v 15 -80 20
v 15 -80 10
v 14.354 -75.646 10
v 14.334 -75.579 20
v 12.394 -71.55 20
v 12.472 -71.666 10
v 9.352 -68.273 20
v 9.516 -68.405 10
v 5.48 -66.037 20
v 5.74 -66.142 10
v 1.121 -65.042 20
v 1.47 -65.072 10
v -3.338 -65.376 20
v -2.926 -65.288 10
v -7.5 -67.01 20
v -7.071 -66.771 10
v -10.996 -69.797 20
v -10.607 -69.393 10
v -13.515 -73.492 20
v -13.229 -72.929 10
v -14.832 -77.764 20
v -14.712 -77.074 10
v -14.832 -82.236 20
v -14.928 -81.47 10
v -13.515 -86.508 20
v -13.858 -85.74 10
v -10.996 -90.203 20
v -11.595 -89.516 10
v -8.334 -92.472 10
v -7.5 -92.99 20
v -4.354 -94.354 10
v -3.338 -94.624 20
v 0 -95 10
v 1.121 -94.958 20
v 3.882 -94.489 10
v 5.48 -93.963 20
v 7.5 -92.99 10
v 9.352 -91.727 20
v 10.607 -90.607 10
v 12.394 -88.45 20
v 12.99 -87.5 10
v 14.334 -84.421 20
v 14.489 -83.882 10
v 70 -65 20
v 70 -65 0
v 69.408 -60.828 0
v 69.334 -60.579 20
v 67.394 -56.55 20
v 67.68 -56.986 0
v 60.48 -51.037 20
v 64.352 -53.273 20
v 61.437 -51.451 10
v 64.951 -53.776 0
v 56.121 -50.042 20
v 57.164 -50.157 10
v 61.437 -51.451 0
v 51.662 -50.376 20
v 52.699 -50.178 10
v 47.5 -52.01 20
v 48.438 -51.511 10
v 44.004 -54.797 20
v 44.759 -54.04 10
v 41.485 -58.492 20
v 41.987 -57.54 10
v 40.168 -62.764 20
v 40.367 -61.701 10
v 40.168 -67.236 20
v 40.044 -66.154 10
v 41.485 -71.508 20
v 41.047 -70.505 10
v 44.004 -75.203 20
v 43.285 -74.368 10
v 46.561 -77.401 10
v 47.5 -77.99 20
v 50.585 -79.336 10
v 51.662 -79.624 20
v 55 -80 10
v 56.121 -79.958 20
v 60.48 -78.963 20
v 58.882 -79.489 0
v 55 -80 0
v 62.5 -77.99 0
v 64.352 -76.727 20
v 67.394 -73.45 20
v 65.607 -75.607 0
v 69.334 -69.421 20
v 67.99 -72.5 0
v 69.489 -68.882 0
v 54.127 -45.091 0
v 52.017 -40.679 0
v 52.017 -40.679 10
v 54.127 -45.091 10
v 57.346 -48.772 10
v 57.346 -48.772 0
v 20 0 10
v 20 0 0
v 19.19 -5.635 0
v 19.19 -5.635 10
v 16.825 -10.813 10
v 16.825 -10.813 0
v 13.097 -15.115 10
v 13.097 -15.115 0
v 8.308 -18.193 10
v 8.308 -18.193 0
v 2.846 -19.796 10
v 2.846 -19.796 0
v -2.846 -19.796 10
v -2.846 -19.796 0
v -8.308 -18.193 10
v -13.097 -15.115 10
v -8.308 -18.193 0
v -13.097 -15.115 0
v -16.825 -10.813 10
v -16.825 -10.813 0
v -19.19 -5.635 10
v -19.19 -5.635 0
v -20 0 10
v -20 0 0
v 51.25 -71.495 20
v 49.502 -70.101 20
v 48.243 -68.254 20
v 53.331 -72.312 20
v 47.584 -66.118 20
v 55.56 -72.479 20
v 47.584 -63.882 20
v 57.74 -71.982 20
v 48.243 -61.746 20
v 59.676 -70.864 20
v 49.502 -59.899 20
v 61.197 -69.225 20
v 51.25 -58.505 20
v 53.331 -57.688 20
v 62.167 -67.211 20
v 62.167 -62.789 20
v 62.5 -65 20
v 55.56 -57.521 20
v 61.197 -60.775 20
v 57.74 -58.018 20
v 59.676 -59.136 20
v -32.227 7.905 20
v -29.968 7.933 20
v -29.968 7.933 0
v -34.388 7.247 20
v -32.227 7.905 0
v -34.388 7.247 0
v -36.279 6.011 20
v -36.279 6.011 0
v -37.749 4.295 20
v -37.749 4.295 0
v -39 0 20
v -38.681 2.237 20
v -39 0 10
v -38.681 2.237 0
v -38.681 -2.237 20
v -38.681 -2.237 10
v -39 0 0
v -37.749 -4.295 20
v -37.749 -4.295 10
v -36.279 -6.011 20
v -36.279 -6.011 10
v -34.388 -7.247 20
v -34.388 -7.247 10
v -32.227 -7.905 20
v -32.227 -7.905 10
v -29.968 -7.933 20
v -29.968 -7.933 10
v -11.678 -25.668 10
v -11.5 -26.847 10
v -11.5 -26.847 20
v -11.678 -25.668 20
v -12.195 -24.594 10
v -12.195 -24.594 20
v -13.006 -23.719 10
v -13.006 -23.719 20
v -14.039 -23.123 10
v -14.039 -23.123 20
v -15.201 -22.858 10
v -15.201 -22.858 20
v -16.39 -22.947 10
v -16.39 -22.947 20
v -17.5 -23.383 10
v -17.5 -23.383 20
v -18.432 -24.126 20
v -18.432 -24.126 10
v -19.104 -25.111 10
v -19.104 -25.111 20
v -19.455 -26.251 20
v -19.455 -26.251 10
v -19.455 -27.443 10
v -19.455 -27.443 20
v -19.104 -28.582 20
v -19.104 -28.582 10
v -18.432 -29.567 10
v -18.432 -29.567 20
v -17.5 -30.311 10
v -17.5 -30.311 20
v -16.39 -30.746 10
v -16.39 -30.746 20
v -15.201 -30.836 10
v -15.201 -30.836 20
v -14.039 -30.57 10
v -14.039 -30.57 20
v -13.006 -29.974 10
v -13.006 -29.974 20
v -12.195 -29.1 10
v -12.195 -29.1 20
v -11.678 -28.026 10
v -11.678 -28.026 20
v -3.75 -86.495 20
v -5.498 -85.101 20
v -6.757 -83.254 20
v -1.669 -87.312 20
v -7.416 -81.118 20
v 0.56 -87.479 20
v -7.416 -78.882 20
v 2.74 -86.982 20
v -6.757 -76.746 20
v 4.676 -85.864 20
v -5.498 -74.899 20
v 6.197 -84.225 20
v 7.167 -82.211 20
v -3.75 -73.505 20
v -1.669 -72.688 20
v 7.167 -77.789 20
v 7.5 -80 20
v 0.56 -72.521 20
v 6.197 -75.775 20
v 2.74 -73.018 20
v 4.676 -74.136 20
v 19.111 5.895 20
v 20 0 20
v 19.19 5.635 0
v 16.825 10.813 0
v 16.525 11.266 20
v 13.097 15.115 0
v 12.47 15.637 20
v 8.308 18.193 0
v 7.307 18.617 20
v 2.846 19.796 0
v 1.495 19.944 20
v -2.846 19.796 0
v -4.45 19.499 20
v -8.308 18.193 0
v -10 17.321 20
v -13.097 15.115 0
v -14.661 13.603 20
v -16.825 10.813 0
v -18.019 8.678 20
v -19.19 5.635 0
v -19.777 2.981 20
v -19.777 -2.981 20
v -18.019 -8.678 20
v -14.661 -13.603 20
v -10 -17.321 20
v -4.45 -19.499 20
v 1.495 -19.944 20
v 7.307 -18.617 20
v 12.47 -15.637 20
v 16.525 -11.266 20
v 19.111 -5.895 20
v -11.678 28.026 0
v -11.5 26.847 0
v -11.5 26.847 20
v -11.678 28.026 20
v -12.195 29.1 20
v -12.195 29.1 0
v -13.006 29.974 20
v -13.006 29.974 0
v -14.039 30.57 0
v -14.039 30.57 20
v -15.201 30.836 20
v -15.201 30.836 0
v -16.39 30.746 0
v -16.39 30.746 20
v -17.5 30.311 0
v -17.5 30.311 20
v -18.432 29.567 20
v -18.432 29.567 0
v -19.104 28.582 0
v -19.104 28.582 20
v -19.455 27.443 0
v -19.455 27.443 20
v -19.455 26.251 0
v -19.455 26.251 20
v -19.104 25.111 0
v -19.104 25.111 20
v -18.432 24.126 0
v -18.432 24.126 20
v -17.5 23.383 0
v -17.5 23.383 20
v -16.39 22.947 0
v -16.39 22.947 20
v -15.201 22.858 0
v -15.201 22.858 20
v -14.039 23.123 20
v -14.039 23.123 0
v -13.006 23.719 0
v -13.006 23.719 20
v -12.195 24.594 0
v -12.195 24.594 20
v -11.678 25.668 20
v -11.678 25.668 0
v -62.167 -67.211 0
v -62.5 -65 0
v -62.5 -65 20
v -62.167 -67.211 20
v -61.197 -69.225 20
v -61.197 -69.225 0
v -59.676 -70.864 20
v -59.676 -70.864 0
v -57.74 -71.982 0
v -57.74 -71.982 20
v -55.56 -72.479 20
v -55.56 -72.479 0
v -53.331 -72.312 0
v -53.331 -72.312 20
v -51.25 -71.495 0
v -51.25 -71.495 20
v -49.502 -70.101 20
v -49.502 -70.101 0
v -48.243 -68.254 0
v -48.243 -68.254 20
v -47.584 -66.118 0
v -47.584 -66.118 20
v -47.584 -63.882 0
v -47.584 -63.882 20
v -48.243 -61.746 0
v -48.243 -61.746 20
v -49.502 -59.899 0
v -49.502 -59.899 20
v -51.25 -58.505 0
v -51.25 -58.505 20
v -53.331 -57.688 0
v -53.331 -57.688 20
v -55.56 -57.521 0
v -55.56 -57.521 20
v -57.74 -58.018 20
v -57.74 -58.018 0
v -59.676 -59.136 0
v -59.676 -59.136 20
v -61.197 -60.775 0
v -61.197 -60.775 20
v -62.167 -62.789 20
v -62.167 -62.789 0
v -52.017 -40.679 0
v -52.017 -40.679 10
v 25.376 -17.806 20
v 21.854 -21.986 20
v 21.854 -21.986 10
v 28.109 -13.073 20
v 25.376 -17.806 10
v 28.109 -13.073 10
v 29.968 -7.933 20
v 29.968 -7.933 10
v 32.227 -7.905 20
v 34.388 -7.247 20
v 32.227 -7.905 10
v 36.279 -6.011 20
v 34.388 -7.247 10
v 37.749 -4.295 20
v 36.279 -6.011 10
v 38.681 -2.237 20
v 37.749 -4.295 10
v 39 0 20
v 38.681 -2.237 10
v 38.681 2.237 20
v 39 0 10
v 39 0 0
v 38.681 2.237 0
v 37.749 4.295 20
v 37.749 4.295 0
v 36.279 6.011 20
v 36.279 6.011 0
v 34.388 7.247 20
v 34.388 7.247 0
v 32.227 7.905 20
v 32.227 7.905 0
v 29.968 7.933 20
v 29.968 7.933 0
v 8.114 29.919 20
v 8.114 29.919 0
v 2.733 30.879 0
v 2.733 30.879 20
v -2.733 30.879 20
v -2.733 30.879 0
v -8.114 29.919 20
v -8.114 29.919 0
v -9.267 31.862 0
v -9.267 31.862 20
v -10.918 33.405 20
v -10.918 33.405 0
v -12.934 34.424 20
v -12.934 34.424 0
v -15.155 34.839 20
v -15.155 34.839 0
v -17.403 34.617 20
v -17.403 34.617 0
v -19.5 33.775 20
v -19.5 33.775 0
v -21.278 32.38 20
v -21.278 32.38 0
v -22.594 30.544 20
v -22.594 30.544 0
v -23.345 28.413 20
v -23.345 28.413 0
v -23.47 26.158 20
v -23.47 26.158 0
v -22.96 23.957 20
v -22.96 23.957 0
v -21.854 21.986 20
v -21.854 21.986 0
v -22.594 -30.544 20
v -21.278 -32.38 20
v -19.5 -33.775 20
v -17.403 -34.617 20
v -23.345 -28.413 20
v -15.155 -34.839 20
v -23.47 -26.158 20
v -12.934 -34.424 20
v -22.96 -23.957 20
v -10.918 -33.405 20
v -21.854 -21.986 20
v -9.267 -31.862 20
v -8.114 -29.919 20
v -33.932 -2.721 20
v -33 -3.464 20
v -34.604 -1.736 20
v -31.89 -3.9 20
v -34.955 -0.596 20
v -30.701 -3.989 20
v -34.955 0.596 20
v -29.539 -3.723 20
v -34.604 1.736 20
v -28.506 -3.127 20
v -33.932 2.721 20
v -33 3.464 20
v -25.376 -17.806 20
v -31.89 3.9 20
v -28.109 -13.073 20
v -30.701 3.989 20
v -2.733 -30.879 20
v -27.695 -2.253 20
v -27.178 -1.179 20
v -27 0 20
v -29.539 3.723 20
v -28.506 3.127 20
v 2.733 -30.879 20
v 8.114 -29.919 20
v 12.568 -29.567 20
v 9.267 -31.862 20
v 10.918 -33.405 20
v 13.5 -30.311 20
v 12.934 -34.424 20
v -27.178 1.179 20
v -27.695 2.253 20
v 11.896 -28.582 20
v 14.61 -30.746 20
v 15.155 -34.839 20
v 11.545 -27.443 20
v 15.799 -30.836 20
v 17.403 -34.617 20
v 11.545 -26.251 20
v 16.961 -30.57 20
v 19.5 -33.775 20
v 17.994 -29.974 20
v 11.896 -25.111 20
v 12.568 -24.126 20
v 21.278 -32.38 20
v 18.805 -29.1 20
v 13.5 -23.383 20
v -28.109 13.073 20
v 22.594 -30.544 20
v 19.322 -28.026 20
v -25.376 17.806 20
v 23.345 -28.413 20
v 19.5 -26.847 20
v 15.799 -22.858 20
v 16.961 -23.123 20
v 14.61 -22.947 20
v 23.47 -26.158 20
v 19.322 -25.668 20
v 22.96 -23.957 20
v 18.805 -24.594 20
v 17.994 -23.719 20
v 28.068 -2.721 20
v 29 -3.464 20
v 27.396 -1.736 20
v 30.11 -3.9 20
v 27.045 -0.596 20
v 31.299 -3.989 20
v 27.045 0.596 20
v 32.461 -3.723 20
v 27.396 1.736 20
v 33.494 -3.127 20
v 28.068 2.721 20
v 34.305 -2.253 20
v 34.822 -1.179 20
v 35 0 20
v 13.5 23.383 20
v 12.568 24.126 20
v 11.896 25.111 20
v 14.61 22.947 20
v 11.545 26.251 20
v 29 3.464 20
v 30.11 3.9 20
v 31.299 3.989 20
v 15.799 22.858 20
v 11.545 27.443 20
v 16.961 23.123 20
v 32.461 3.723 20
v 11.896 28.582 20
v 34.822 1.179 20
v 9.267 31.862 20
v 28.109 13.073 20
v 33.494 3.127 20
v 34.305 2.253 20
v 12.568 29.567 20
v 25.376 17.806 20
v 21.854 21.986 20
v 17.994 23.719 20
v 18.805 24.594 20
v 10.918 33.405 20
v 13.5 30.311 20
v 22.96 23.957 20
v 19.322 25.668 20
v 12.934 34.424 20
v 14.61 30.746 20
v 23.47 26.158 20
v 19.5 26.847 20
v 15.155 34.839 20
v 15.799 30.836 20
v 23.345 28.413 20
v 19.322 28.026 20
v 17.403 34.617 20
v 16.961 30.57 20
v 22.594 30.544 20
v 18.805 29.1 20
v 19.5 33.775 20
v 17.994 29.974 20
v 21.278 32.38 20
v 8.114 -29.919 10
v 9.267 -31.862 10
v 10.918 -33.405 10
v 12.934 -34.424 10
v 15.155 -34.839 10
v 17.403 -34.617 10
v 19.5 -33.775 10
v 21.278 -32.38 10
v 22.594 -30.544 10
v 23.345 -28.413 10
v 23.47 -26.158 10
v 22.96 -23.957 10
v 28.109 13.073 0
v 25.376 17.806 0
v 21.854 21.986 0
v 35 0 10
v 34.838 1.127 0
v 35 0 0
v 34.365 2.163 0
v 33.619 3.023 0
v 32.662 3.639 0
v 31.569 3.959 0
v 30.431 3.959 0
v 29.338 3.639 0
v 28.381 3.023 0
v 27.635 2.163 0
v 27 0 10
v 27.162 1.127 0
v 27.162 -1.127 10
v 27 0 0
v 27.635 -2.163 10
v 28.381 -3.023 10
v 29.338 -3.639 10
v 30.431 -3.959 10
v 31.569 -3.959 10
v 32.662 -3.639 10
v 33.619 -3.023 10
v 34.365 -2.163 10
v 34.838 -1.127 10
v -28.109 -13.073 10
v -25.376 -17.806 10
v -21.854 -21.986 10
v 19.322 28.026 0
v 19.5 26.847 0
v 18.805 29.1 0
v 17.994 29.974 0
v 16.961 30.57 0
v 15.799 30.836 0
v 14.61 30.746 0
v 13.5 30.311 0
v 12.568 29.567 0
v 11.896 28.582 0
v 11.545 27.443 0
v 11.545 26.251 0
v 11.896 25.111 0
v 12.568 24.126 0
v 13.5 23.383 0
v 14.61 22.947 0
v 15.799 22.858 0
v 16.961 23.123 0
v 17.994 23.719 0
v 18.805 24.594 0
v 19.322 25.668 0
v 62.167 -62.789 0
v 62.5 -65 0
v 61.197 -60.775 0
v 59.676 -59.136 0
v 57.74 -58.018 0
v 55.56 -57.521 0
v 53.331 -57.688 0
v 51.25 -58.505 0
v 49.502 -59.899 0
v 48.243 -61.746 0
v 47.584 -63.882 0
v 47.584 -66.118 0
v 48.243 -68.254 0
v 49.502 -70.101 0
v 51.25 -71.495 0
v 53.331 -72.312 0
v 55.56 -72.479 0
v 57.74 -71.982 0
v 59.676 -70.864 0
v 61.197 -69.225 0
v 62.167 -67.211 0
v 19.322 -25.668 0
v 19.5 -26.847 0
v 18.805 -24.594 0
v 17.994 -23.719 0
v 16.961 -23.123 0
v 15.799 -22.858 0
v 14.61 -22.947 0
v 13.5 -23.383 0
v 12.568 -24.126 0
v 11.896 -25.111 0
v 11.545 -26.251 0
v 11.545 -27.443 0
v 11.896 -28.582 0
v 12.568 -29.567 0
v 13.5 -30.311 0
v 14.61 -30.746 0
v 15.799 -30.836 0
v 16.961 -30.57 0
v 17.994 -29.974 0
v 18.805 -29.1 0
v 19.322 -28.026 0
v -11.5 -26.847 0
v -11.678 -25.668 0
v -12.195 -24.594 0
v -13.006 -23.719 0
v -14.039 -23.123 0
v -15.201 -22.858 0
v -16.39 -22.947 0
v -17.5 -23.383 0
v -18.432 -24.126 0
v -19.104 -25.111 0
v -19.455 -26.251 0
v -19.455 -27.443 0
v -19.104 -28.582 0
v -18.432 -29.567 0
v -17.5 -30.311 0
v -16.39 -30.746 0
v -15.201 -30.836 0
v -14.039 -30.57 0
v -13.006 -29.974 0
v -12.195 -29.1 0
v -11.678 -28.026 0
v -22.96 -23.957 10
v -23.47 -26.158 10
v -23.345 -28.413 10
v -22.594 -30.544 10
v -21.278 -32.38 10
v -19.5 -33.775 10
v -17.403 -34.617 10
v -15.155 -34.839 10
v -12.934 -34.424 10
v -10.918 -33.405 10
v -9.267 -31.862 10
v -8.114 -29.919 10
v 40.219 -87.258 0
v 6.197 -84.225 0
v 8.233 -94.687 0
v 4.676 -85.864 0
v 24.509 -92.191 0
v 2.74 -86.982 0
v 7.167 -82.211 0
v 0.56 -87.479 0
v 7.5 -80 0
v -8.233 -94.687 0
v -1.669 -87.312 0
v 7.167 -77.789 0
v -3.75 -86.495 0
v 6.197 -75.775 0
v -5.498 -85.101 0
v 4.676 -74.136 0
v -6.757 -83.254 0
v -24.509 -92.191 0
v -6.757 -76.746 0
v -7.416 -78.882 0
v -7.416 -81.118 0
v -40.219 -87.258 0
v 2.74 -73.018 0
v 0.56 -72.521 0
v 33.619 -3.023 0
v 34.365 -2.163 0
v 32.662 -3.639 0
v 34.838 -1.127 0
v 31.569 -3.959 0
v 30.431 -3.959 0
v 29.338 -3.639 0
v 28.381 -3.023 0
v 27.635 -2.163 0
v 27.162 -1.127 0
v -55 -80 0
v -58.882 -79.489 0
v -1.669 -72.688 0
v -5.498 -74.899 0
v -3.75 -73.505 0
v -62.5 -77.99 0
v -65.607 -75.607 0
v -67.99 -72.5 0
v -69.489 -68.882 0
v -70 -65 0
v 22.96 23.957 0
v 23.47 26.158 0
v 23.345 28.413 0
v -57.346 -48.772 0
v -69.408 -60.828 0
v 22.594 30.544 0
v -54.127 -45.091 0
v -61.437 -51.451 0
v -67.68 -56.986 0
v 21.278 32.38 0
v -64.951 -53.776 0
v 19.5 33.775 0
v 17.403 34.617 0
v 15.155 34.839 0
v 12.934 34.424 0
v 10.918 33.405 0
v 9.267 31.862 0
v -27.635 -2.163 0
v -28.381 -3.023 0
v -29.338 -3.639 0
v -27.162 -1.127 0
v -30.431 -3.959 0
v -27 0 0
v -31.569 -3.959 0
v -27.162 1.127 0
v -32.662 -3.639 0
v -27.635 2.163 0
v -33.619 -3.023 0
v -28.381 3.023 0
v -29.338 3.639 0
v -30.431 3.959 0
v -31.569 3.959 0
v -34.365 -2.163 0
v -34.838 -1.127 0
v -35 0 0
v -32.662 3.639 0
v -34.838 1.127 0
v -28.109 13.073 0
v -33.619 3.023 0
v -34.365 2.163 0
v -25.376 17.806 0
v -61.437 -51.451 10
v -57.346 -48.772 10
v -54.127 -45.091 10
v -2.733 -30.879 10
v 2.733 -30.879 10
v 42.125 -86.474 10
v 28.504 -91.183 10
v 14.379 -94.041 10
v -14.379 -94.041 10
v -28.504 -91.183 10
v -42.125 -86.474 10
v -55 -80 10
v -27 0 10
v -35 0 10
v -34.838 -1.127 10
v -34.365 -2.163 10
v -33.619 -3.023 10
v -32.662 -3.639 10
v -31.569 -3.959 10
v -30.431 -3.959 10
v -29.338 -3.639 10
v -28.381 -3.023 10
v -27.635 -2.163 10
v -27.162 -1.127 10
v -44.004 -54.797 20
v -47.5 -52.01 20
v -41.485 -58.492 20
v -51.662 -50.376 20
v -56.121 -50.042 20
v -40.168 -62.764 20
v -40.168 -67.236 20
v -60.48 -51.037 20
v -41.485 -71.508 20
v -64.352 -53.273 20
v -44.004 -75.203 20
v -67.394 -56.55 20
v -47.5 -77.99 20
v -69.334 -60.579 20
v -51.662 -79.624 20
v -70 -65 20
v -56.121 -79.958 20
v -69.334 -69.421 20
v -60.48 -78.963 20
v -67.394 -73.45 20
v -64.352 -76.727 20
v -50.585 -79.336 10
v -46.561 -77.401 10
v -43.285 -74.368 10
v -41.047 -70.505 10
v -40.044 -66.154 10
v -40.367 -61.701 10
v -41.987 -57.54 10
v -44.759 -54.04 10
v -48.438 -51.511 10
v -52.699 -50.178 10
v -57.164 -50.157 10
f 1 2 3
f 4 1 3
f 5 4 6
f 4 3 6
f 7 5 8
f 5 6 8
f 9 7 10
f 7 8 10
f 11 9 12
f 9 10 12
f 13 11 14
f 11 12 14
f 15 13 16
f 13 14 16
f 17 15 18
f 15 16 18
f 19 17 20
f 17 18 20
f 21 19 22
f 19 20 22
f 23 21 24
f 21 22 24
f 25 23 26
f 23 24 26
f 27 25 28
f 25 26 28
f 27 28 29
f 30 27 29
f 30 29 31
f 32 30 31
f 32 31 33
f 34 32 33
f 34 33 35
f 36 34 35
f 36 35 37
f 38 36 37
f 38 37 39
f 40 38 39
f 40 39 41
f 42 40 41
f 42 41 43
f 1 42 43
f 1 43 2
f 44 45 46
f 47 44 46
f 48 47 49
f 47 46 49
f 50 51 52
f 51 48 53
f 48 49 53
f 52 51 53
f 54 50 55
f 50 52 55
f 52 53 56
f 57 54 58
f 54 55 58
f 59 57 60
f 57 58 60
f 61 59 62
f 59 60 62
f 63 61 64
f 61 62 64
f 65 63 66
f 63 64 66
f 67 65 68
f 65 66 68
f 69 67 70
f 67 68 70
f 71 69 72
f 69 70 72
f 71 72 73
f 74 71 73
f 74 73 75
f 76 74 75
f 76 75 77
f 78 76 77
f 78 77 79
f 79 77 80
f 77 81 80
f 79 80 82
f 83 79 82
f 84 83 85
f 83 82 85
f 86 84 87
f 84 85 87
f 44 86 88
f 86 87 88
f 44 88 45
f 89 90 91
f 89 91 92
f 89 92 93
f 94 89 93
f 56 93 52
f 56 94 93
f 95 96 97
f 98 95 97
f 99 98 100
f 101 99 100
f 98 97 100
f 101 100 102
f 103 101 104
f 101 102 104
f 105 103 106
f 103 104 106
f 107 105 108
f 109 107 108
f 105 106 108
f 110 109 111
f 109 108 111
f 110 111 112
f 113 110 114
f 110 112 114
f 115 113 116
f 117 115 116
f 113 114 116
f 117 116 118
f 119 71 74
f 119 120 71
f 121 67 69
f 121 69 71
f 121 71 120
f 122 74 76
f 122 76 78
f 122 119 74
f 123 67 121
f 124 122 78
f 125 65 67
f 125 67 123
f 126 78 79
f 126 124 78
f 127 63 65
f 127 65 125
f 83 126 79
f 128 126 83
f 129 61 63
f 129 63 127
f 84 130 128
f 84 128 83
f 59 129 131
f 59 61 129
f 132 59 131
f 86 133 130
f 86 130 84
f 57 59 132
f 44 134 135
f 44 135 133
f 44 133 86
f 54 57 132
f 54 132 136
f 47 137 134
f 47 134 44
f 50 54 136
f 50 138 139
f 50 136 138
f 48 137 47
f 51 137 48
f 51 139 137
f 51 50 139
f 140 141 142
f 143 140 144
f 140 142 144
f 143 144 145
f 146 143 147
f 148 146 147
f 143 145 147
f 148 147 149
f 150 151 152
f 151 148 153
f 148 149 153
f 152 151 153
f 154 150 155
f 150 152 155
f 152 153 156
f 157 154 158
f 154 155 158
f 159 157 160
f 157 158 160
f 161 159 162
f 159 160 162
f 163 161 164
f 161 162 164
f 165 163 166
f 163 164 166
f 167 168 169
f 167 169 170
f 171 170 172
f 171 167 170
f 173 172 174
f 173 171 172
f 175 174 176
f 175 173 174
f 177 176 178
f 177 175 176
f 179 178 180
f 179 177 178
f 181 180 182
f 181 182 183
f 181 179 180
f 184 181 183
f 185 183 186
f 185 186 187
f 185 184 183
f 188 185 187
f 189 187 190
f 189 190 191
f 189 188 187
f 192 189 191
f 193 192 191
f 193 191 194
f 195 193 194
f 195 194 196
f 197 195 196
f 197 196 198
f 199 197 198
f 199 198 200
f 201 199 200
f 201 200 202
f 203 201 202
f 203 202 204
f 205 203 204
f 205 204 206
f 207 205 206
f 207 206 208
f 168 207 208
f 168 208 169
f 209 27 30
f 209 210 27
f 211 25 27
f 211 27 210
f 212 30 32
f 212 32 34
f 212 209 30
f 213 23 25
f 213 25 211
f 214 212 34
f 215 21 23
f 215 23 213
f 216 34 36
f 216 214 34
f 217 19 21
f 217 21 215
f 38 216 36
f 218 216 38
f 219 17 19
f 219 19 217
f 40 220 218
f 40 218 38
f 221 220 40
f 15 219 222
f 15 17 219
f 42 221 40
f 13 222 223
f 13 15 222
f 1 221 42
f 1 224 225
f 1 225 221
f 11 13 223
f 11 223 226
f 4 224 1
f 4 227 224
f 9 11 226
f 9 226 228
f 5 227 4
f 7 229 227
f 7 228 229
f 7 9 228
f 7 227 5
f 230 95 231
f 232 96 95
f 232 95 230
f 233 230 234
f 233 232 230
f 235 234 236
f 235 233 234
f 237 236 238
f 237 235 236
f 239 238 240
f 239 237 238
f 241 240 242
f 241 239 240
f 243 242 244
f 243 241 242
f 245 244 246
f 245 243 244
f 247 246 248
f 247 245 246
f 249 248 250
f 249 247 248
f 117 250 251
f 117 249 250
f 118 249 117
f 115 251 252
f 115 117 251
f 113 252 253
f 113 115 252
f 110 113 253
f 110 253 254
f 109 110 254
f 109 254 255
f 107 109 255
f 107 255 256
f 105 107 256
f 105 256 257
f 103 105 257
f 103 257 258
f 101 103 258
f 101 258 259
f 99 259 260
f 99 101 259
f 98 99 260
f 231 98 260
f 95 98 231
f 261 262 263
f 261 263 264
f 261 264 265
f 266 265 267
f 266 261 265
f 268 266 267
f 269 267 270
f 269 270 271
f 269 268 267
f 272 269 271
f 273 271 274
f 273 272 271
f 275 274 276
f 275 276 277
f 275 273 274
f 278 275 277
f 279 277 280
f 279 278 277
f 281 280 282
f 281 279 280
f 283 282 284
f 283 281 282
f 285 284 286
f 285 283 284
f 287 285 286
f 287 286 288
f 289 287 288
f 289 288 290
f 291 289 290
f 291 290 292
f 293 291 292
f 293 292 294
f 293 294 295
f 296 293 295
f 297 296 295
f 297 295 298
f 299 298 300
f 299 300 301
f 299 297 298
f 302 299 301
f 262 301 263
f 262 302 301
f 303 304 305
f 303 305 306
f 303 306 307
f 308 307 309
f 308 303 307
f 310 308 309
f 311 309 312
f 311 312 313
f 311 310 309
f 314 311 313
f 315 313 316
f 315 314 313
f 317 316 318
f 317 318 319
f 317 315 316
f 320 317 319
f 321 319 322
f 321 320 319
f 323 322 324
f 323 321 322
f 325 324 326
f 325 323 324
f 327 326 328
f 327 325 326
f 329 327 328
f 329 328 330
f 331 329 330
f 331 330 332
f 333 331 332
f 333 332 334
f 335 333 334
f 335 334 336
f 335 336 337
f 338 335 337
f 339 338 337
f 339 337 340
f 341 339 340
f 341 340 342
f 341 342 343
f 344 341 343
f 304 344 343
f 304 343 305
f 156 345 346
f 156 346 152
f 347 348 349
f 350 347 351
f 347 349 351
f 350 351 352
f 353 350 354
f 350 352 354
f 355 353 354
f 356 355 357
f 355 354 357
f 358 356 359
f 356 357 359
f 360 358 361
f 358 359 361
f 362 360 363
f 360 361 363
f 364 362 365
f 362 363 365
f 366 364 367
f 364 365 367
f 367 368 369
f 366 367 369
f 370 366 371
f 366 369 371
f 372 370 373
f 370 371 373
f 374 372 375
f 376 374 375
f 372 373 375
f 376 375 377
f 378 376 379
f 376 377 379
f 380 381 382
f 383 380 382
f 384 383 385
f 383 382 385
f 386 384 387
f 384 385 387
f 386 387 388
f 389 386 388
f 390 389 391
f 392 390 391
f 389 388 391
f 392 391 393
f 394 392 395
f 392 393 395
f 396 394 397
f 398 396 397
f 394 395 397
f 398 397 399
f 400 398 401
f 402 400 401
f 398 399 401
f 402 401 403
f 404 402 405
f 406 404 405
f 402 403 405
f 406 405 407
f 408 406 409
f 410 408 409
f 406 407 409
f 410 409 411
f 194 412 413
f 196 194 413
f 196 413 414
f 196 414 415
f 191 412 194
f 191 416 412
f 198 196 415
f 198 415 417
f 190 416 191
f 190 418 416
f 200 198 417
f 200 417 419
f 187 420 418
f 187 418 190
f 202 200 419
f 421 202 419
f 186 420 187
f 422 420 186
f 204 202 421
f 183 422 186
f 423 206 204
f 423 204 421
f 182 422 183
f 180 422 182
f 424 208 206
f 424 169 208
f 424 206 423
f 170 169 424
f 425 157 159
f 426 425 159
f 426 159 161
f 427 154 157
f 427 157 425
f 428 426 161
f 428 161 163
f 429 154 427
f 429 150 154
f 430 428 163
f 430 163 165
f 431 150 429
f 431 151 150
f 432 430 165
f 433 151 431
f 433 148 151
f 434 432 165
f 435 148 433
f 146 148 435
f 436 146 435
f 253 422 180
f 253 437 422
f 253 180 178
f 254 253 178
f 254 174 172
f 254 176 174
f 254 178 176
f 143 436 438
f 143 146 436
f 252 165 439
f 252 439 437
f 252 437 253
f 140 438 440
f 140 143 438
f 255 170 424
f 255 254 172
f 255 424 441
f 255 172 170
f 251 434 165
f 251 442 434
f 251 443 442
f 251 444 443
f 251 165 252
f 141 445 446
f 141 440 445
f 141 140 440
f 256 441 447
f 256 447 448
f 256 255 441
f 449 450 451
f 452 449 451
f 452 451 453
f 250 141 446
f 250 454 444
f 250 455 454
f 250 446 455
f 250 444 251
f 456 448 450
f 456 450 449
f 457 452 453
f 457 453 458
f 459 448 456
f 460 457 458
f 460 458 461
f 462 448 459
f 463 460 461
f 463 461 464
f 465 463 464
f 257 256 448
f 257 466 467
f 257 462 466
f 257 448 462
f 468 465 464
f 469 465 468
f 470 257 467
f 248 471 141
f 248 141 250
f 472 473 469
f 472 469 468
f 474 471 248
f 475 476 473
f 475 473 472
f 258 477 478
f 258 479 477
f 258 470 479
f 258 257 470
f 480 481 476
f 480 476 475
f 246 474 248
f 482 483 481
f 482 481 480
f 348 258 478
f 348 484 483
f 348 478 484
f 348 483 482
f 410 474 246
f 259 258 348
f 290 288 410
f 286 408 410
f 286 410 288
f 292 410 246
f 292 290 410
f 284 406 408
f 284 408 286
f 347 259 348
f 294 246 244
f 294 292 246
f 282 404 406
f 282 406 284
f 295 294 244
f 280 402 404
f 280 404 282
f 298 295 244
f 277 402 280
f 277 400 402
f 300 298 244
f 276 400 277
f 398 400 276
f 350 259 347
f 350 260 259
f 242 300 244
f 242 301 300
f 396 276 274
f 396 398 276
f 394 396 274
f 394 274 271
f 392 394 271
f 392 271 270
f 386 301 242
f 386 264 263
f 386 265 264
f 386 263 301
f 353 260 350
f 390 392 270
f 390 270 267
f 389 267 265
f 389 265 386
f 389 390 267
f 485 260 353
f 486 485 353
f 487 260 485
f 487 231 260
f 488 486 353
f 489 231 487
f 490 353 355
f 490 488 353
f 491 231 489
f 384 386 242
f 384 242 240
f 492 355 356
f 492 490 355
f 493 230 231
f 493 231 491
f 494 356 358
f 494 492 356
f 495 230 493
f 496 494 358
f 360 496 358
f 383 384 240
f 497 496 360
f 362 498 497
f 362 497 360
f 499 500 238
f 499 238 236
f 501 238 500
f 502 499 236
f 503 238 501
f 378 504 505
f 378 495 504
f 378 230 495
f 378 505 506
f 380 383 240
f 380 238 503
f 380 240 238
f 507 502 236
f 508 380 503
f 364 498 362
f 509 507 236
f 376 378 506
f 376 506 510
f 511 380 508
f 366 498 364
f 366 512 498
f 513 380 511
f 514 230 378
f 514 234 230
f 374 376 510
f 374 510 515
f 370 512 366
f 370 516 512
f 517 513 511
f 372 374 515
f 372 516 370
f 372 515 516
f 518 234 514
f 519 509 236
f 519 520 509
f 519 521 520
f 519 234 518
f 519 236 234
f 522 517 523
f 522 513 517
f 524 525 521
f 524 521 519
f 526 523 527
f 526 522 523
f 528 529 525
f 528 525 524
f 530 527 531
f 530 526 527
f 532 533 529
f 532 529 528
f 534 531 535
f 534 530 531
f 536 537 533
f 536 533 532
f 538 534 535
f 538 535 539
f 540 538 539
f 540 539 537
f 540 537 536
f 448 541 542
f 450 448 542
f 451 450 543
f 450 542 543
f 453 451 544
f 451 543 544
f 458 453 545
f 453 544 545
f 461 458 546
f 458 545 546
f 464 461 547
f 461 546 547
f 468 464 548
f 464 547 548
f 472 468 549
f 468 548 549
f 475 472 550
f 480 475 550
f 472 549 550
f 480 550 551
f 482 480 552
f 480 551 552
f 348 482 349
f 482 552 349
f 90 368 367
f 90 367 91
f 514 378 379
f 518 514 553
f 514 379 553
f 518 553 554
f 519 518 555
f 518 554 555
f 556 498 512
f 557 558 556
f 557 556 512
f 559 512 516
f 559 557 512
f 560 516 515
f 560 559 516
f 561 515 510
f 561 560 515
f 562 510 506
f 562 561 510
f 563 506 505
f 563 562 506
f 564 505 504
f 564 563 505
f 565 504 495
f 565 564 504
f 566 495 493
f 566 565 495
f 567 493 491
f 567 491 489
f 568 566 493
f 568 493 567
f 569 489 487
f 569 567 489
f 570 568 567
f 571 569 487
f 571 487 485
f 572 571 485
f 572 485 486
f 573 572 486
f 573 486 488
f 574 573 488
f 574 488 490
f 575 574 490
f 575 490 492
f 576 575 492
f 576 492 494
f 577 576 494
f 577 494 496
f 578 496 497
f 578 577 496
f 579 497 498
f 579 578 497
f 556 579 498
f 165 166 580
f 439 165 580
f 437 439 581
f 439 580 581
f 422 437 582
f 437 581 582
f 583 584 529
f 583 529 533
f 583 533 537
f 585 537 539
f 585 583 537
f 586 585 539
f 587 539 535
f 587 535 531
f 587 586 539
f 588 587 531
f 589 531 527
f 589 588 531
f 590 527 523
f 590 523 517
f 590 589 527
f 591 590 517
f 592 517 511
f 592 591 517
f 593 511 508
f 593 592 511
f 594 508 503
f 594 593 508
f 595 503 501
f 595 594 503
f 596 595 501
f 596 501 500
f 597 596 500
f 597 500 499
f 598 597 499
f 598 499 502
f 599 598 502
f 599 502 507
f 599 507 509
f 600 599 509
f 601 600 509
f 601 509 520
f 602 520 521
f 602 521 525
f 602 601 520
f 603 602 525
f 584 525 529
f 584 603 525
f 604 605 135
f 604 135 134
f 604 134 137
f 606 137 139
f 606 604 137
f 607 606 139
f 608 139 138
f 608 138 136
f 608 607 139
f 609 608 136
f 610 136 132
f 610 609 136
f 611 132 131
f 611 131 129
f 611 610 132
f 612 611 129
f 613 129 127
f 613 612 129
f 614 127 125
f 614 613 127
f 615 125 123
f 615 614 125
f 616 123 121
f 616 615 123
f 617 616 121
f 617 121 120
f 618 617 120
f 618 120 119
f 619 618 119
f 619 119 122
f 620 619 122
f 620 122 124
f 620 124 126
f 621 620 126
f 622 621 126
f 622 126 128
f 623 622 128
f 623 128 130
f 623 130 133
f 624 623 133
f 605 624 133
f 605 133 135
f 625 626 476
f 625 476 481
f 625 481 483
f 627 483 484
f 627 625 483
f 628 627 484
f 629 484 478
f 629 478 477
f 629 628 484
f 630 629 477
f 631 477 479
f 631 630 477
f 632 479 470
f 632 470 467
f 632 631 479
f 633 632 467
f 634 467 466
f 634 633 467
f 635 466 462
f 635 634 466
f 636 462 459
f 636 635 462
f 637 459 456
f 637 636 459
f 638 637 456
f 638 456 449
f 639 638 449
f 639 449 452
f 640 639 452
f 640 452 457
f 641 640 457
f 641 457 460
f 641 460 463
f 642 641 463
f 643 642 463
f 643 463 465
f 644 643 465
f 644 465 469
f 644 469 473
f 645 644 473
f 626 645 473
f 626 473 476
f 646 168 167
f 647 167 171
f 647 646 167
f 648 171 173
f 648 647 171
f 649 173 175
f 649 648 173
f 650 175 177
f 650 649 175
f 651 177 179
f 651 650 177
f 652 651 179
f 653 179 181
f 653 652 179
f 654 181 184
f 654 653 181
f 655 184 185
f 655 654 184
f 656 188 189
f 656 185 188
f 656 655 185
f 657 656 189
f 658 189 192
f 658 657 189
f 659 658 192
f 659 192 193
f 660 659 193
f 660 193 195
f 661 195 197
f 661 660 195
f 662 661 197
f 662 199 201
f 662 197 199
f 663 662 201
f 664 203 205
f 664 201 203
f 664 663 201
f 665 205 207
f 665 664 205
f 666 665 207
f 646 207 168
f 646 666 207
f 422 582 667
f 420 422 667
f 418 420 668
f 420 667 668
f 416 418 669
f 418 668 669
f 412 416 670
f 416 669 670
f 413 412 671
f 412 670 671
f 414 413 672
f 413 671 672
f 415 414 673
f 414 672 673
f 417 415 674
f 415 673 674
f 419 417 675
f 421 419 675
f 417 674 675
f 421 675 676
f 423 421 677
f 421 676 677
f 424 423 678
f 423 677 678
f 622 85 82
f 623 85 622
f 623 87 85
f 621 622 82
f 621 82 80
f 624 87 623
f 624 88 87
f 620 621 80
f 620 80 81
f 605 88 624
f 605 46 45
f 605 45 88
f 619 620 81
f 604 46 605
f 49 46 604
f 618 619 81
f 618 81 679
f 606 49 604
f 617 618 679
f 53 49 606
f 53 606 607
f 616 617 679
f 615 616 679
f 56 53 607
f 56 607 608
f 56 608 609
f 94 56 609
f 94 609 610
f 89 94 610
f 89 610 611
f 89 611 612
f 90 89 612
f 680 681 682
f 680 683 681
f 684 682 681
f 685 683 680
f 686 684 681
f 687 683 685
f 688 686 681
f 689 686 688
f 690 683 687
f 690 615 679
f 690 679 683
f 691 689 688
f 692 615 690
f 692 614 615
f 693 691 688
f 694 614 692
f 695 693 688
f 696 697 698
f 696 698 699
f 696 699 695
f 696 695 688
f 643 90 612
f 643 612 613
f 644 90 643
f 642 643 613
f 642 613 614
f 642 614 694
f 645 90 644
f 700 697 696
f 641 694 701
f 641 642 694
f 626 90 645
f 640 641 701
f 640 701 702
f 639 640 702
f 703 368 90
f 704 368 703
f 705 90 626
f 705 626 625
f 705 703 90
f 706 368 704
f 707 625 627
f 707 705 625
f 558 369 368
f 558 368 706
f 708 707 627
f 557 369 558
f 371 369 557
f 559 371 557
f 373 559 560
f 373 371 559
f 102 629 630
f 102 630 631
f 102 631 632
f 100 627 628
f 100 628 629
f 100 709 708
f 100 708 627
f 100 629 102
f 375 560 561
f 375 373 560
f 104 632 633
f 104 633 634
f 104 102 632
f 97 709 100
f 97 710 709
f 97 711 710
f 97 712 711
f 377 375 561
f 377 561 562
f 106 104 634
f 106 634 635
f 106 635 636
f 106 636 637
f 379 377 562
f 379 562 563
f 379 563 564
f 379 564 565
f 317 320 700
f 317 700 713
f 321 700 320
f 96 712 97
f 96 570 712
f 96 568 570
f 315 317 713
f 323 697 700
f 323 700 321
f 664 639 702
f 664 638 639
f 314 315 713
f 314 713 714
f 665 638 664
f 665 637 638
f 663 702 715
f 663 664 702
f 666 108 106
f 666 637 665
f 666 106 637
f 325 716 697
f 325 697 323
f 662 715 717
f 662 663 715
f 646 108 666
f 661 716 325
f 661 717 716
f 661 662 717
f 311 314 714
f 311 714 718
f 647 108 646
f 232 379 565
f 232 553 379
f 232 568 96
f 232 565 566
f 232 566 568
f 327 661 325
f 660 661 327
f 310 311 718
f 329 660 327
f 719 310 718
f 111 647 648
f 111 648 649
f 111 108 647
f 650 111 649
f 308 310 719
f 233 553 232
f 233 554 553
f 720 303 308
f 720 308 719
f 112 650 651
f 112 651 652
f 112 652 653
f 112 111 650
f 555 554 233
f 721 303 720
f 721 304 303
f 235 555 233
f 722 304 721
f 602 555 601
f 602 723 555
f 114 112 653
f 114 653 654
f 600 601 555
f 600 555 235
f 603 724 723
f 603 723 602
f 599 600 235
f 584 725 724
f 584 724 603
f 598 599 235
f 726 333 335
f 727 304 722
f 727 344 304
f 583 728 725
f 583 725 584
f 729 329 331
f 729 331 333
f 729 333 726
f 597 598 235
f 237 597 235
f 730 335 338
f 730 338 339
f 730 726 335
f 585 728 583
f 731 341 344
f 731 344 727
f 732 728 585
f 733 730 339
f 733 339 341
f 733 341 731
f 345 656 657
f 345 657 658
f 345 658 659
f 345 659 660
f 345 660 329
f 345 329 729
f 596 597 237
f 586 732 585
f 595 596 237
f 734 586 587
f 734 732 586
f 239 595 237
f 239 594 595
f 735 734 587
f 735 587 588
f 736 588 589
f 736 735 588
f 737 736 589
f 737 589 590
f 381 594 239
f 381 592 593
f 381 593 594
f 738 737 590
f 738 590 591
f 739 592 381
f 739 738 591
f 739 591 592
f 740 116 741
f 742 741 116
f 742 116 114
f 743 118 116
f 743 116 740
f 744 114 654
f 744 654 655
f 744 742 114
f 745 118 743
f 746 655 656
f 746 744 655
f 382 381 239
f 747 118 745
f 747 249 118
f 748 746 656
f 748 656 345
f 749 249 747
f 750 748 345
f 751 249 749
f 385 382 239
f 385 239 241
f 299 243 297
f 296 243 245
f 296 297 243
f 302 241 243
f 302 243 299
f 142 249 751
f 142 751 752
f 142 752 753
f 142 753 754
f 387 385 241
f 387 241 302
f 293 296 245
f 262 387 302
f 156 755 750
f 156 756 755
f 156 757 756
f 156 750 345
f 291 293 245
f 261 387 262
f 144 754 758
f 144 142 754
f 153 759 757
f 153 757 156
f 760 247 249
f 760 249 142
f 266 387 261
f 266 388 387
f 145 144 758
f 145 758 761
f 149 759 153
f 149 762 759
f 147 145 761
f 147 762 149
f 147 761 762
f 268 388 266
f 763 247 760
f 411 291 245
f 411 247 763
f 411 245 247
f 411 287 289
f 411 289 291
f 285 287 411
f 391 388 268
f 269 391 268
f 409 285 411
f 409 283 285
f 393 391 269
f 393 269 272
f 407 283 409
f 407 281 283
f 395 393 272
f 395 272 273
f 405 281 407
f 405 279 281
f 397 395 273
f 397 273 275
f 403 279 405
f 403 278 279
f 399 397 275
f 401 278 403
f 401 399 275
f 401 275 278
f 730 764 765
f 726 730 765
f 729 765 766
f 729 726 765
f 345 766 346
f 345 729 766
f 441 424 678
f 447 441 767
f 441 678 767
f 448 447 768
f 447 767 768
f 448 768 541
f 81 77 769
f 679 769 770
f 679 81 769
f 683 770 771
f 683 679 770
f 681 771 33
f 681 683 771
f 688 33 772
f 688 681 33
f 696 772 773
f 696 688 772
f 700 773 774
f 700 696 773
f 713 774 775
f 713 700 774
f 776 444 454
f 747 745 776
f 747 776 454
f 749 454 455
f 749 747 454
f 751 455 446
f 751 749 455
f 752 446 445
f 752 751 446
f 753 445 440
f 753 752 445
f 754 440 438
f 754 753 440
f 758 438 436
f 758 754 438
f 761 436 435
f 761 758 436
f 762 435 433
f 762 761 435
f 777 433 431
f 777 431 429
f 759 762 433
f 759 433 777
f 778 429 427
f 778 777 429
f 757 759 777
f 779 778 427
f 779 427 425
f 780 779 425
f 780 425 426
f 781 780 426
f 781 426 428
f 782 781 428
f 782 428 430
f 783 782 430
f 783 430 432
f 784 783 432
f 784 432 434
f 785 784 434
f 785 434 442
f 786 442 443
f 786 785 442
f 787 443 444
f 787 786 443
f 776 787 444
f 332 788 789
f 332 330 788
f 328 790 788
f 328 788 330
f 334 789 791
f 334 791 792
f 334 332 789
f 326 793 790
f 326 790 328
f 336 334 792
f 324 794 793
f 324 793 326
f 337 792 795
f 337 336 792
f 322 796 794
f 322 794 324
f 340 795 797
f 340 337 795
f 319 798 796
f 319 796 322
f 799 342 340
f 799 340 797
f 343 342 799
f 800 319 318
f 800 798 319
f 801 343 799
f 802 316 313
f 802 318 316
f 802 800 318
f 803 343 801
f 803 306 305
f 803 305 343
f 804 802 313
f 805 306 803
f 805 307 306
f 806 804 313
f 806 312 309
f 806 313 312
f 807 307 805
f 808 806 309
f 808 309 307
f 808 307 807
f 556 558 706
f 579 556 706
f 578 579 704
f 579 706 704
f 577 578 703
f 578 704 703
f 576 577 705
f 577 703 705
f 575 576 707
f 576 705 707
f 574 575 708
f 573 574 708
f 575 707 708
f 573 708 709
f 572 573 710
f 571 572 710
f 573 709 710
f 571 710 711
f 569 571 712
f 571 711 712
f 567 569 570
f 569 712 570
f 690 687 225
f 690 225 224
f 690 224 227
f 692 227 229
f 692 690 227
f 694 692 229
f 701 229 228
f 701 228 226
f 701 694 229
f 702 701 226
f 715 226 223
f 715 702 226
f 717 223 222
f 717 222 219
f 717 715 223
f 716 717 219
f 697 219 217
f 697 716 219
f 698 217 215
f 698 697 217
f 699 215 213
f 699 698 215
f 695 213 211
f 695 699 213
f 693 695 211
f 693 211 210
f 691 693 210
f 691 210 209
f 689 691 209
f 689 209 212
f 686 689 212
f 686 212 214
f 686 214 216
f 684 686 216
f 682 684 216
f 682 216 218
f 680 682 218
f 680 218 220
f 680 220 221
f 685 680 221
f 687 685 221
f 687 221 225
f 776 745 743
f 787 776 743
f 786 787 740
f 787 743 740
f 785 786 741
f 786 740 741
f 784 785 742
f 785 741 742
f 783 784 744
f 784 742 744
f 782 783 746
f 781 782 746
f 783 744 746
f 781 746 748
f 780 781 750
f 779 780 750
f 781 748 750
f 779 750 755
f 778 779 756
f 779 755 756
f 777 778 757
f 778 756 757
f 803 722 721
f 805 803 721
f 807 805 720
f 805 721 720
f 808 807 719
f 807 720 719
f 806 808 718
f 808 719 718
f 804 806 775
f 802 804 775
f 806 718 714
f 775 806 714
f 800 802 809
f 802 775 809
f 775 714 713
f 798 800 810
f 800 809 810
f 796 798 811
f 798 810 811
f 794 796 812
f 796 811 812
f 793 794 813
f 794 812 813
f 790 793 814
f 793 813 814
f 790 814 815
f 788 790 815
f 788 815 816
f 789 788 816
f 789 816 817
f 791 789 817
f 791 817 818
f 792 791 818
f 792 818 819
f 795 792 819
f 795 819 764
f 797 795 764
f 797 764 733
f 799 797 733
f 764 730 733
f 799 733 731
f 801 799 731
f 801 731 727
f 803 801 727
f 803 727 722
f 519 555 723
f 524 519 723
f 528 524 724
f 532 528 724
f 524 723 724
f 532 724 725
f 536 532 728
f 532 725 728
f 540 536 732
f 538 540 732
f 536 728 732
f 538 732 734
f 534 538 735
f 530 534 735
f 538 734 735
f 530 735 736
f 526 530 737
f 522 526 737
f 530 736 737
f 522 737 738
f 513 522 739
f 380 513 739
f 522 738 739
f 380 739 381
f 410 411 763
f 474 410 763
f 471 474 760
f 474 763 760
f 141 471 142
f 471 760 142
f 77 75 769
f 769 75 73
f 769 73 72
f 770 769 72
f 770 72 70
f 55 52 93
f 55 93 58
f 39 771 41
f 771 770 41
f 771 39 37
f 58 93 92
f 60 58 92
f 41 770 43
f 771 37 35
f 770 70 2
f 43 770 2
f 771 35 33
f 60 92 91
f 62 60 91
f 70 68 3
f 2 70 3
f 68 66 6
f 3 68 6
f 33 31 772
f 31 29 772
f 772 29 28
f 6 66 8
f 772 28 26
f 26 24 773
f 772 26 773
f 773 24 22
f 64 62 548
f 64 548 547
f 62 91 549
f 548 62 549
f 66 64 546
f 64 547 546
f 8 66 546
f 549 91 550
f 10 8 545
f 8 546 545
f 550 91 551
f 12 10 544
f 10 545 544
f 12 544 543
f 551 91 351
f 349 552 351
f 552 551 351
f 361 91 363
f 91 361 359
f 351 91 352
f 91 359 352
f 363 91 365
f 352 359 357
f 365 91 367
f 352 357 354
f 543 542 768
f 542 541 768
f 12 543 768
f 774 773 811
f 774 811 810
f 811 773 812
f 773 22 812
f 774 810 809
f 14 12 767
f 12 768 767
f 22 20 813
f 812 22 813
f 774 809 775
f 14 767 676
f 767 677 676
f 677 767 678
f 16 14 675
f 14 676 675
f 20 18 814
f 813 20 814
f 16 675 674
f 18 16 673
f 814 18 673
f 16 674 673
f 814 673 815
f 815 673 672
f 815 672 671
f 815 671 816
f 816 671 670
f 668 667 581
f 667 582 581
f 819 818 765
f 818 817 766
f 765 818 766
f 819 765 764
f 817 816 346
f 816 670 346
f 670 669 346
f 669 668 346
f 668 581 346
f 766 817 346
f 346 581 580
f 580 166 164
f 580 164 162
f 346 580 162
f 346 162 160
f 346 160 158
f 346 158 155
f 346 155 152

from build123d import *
from build123d.topology import SkipClean

# Parameters (mm, degrees)
CROQUIS1_R                = 15
CROQUIS1_R_2              = 7.5
SALIENTE_EXTRUIR1_DEPTH   = 20
SALIENTE_EXTRUIR1_2_DEPTH = 20
SALIENTE_EXTRUIR1_3_DEPTH = 20
CROQUIS1_R_3              = 20
CROQUIS1_R_4              = 4
SALIENTE_EXTRUIR1_4_DEPTH = 20
SALIENTE_EXTRUIR2_DEPTH   = 10
CORTAR_EXTRUIR2_START     = -10
CORTAR_EXTRUIR2_DEPTH     = 10
CORTAR_EXTRUIR3_START     = -10
CROQUIS6_R                = 7.5
CROQUIS6_R_2              = 4
CORTAR_EXTRUIR3_DEPTH     = 10


with BuildPart() as part:
    # Croquis1 → Saliente-Extruir1 (new body)
    with BuildSketch(Plane.XY):
        with Locations((0, -80)):
            Circle(CROQUIS1_R)
        with Locations((0, -80)):
            Circle(CROQUIS1_R_2, mode=Mode.SUBTRACT)
    extrude(amount=SALIENTE_EXTRUIR1_DEPTH)



with BuildPart() as body_2:
    # Croquis1 → Saliente-Extruir1 2 (new body)
    with BuildSketch(Plane.XY):
        with Locations((55, -65)):
            Circle(CROQUIS1_R)
        with Locations((55, -65)):
            Circle(CROQUIS1_R_2, mode=Mode.SUBTRACT)
    extrude(amount=SALIENTE_EXTRUIR1_2_DEPTH)


with BuildPart() as body_3:
    # Croquis1 → Saliente-Extruir1 3 (new body)
    with BuildSketch(Plane.XY):
        with Locations((-55, -65)):
            Circle(CROQUIS1_R)
        with Locations((-55, -65)):
            Circle(CROQUIS1_R_2, mode=Mode.SUBTRACT)
    extrude(amount=SALIENTE_EXTRUIR1_3_DEPTH)


with BuildPart() as body_4:
    # Croquis1 → Saliente-Extruir1 4 (new body)
    with BuildSketch(Plane.XY):
        with BuildLine():
            ThreePointArc((29.967741935, -7.933123174), (39, 0), (29.967741935, 7.933123174))
            ThreePointArc((29.967741935, 7.933123174), (26.846787517, 15.5), (21.854157167, 21.986264223))
            ThreePointArc((21.854157167, 21.986264223), (19.5, 33.774990748), (8.113584768, 29.919387397))
            ThreePointArc((8.113584768, 29.919387397), (0, 31), (-8.113584768, 29.919387397))
            ThreePointArc((-8.113584768, 29.919387397), (-19.5, 33.774990748), (-21.854157167, 21.986264223))
            ThreePointArc((-21.854157167, 21.986264223), (-26.846787517, 15.5), (-29.967741935, 7.933123174))
            ThreePointArc((-29.967741935, 7.933123174), (-39, 0), (-29.967741935, -7.933123174))
            ThreePointArc((-29.967741935, -7.933123174), (-26.846787517, -15.5), (-21.854157167, -21.986264223))
            ThreePointArc((-21.854157167, -21.986264223), (-19.5, -33.774990748), (-8.113584768, -29.919387397))
            ThreePointArc((-8.113584768, -29.919387397), (0, -31), (8.113584768, -29.919387397))
            ThreePointArc((8.113584768, -29.919387397), (19.5, -33.774990748), (21.854157167, -21.986264223))
            ThreePointArc((21.854157167, -21.986264223), (26.846787517, -15.5), (29.967741935, -7.933123174))
        make_face()
        Circle(CROQUIS1_R_3, mode=Mode.SUBTRACT)
        with Locations((31, 0)):
            Circle(CROQUIS1_R_4, mode=Mode.SUBTRACT)
        with Locations((15.5, -26.846787517)):
            Circle(CROQUIS1_R_4, mode=Mode.SUBTRACT)
        with Locations((-15.5, -26.846787517)):
            Circle(CROQUIS1_R_4, mode=Mode.SUBTRACT)
        with Locations((-31, 0)):
            Circle(CROQUIS1_R_4, mode=Mode.SUBTRACT)
        with Locations((-15.5, 26.846787517)):
            Circle(CROQUIS1_R_4, mode=Mode.SUBTRACT)
        with Locations((15.5, 26.846787517)):
            Circle(CROQUIS1_R_4, mode=Mode.SUBTRACT)
    extrude(amount=SALIENTE_EXTRUIR1_4_DEPTH)


with BuildPart() as part_1:
    with SkipClean():  # the faces are left unmerged after this step: merging them gives an invalid solid
        add(part.part)

        add(body_2.part)  # Saliente-Extruir2 merges body 2

        add(body_3.part)  # Saliente-Extruir2 merges body 3

        add(body_4.part)  # Saliente-Extruir2 merges body 4
        # Croquis2 → Saliente-Extruir2 (add)
        with BuildSketch(Plane.XY):
            with BuildLine():
                Line((39, 0), (52.017194873, -40.678733978))
                ThreePointArc((52.017194873, -40.678733978), (55.61045151, -47.041283696), (61.436740692, -51.451259495))
                ThreePointArc((61.436740692, -51.451259495), (69.632687852, -68.29915841), (55, -80))
                ThreePointArc((55, -80), (0, -95), (-55, -80))
                ThreePointArc((-55, -80), (-69.632687852, -68.29915841), (-61.436740692, -51.451259495))
                ThreePointArc((-61.436740692, -51.451259495), (-55.61045151, -47.041283696), (-52.017194873, -40.678733978))
                Line((-52.017194873, -40.678733978), (-39, 0))
                Line((-39, 0), (39, 0))
            make_face()
        extrude(amount=SALIENTE_EXTRUIR2_DEPTH)

    # Croquis5 → Cortar-Extruir2 (cut)
    with SkipClean():  # the faces are left unmerged after this step: merging them gives an invalid solid
        with BuildSketch(Plane.XY.offset(10).offset(CORTAR_EXTRUIR2_START)):
            with BuildLine():
                Line((-20, 0), (20, 0))
                ThreePointArc((20, 0), (0, -20), (-20, 0))
            make_face()
        extrude(amount=CORTAR_EXTRUIR2_DEPTH, mode=Mode.SUBTRACT)

    # Croquis6 → Cortar-Extruir3 (cut)
    with SkipClean():  # the faces are left unmerged after this step: merging them gives an invalid solid
        with BuildSketch(Plane.XY.offset(10).offset(CORTAR_EXTRUIR3_START)):
            with Locations((-55, -65)):
                Circle(CROQUIS6_R)
            with Locations((0, -80)):
                Circle(CROQUIS6_R)
            with Locations((55, -65)):
                Circle(CROQUIS6_R)
            with Locations((15.5, -26.846787517)):
                Circle(CROQUIS6_R_2)
            with Locations((-15.5, -26.846787517)):
                Circle(CROQUIS6_R_2)
            with BuildLine():
                Line((-35, 0), (-27, 0))
                ThreePointArc((-27, 0), (-31, -4), (-35, 0))
            make_face()
            with BuildLine():
                Line((27, 0), (35, 0))
                ThreePointArc((35, 0), (31, -4), (27, 0))
            make_face()
        extrude(amount=CORTAR_EXTRUIR3_DEPTH, mode=Mode.SUBTRACT)


solid = part_1.part
